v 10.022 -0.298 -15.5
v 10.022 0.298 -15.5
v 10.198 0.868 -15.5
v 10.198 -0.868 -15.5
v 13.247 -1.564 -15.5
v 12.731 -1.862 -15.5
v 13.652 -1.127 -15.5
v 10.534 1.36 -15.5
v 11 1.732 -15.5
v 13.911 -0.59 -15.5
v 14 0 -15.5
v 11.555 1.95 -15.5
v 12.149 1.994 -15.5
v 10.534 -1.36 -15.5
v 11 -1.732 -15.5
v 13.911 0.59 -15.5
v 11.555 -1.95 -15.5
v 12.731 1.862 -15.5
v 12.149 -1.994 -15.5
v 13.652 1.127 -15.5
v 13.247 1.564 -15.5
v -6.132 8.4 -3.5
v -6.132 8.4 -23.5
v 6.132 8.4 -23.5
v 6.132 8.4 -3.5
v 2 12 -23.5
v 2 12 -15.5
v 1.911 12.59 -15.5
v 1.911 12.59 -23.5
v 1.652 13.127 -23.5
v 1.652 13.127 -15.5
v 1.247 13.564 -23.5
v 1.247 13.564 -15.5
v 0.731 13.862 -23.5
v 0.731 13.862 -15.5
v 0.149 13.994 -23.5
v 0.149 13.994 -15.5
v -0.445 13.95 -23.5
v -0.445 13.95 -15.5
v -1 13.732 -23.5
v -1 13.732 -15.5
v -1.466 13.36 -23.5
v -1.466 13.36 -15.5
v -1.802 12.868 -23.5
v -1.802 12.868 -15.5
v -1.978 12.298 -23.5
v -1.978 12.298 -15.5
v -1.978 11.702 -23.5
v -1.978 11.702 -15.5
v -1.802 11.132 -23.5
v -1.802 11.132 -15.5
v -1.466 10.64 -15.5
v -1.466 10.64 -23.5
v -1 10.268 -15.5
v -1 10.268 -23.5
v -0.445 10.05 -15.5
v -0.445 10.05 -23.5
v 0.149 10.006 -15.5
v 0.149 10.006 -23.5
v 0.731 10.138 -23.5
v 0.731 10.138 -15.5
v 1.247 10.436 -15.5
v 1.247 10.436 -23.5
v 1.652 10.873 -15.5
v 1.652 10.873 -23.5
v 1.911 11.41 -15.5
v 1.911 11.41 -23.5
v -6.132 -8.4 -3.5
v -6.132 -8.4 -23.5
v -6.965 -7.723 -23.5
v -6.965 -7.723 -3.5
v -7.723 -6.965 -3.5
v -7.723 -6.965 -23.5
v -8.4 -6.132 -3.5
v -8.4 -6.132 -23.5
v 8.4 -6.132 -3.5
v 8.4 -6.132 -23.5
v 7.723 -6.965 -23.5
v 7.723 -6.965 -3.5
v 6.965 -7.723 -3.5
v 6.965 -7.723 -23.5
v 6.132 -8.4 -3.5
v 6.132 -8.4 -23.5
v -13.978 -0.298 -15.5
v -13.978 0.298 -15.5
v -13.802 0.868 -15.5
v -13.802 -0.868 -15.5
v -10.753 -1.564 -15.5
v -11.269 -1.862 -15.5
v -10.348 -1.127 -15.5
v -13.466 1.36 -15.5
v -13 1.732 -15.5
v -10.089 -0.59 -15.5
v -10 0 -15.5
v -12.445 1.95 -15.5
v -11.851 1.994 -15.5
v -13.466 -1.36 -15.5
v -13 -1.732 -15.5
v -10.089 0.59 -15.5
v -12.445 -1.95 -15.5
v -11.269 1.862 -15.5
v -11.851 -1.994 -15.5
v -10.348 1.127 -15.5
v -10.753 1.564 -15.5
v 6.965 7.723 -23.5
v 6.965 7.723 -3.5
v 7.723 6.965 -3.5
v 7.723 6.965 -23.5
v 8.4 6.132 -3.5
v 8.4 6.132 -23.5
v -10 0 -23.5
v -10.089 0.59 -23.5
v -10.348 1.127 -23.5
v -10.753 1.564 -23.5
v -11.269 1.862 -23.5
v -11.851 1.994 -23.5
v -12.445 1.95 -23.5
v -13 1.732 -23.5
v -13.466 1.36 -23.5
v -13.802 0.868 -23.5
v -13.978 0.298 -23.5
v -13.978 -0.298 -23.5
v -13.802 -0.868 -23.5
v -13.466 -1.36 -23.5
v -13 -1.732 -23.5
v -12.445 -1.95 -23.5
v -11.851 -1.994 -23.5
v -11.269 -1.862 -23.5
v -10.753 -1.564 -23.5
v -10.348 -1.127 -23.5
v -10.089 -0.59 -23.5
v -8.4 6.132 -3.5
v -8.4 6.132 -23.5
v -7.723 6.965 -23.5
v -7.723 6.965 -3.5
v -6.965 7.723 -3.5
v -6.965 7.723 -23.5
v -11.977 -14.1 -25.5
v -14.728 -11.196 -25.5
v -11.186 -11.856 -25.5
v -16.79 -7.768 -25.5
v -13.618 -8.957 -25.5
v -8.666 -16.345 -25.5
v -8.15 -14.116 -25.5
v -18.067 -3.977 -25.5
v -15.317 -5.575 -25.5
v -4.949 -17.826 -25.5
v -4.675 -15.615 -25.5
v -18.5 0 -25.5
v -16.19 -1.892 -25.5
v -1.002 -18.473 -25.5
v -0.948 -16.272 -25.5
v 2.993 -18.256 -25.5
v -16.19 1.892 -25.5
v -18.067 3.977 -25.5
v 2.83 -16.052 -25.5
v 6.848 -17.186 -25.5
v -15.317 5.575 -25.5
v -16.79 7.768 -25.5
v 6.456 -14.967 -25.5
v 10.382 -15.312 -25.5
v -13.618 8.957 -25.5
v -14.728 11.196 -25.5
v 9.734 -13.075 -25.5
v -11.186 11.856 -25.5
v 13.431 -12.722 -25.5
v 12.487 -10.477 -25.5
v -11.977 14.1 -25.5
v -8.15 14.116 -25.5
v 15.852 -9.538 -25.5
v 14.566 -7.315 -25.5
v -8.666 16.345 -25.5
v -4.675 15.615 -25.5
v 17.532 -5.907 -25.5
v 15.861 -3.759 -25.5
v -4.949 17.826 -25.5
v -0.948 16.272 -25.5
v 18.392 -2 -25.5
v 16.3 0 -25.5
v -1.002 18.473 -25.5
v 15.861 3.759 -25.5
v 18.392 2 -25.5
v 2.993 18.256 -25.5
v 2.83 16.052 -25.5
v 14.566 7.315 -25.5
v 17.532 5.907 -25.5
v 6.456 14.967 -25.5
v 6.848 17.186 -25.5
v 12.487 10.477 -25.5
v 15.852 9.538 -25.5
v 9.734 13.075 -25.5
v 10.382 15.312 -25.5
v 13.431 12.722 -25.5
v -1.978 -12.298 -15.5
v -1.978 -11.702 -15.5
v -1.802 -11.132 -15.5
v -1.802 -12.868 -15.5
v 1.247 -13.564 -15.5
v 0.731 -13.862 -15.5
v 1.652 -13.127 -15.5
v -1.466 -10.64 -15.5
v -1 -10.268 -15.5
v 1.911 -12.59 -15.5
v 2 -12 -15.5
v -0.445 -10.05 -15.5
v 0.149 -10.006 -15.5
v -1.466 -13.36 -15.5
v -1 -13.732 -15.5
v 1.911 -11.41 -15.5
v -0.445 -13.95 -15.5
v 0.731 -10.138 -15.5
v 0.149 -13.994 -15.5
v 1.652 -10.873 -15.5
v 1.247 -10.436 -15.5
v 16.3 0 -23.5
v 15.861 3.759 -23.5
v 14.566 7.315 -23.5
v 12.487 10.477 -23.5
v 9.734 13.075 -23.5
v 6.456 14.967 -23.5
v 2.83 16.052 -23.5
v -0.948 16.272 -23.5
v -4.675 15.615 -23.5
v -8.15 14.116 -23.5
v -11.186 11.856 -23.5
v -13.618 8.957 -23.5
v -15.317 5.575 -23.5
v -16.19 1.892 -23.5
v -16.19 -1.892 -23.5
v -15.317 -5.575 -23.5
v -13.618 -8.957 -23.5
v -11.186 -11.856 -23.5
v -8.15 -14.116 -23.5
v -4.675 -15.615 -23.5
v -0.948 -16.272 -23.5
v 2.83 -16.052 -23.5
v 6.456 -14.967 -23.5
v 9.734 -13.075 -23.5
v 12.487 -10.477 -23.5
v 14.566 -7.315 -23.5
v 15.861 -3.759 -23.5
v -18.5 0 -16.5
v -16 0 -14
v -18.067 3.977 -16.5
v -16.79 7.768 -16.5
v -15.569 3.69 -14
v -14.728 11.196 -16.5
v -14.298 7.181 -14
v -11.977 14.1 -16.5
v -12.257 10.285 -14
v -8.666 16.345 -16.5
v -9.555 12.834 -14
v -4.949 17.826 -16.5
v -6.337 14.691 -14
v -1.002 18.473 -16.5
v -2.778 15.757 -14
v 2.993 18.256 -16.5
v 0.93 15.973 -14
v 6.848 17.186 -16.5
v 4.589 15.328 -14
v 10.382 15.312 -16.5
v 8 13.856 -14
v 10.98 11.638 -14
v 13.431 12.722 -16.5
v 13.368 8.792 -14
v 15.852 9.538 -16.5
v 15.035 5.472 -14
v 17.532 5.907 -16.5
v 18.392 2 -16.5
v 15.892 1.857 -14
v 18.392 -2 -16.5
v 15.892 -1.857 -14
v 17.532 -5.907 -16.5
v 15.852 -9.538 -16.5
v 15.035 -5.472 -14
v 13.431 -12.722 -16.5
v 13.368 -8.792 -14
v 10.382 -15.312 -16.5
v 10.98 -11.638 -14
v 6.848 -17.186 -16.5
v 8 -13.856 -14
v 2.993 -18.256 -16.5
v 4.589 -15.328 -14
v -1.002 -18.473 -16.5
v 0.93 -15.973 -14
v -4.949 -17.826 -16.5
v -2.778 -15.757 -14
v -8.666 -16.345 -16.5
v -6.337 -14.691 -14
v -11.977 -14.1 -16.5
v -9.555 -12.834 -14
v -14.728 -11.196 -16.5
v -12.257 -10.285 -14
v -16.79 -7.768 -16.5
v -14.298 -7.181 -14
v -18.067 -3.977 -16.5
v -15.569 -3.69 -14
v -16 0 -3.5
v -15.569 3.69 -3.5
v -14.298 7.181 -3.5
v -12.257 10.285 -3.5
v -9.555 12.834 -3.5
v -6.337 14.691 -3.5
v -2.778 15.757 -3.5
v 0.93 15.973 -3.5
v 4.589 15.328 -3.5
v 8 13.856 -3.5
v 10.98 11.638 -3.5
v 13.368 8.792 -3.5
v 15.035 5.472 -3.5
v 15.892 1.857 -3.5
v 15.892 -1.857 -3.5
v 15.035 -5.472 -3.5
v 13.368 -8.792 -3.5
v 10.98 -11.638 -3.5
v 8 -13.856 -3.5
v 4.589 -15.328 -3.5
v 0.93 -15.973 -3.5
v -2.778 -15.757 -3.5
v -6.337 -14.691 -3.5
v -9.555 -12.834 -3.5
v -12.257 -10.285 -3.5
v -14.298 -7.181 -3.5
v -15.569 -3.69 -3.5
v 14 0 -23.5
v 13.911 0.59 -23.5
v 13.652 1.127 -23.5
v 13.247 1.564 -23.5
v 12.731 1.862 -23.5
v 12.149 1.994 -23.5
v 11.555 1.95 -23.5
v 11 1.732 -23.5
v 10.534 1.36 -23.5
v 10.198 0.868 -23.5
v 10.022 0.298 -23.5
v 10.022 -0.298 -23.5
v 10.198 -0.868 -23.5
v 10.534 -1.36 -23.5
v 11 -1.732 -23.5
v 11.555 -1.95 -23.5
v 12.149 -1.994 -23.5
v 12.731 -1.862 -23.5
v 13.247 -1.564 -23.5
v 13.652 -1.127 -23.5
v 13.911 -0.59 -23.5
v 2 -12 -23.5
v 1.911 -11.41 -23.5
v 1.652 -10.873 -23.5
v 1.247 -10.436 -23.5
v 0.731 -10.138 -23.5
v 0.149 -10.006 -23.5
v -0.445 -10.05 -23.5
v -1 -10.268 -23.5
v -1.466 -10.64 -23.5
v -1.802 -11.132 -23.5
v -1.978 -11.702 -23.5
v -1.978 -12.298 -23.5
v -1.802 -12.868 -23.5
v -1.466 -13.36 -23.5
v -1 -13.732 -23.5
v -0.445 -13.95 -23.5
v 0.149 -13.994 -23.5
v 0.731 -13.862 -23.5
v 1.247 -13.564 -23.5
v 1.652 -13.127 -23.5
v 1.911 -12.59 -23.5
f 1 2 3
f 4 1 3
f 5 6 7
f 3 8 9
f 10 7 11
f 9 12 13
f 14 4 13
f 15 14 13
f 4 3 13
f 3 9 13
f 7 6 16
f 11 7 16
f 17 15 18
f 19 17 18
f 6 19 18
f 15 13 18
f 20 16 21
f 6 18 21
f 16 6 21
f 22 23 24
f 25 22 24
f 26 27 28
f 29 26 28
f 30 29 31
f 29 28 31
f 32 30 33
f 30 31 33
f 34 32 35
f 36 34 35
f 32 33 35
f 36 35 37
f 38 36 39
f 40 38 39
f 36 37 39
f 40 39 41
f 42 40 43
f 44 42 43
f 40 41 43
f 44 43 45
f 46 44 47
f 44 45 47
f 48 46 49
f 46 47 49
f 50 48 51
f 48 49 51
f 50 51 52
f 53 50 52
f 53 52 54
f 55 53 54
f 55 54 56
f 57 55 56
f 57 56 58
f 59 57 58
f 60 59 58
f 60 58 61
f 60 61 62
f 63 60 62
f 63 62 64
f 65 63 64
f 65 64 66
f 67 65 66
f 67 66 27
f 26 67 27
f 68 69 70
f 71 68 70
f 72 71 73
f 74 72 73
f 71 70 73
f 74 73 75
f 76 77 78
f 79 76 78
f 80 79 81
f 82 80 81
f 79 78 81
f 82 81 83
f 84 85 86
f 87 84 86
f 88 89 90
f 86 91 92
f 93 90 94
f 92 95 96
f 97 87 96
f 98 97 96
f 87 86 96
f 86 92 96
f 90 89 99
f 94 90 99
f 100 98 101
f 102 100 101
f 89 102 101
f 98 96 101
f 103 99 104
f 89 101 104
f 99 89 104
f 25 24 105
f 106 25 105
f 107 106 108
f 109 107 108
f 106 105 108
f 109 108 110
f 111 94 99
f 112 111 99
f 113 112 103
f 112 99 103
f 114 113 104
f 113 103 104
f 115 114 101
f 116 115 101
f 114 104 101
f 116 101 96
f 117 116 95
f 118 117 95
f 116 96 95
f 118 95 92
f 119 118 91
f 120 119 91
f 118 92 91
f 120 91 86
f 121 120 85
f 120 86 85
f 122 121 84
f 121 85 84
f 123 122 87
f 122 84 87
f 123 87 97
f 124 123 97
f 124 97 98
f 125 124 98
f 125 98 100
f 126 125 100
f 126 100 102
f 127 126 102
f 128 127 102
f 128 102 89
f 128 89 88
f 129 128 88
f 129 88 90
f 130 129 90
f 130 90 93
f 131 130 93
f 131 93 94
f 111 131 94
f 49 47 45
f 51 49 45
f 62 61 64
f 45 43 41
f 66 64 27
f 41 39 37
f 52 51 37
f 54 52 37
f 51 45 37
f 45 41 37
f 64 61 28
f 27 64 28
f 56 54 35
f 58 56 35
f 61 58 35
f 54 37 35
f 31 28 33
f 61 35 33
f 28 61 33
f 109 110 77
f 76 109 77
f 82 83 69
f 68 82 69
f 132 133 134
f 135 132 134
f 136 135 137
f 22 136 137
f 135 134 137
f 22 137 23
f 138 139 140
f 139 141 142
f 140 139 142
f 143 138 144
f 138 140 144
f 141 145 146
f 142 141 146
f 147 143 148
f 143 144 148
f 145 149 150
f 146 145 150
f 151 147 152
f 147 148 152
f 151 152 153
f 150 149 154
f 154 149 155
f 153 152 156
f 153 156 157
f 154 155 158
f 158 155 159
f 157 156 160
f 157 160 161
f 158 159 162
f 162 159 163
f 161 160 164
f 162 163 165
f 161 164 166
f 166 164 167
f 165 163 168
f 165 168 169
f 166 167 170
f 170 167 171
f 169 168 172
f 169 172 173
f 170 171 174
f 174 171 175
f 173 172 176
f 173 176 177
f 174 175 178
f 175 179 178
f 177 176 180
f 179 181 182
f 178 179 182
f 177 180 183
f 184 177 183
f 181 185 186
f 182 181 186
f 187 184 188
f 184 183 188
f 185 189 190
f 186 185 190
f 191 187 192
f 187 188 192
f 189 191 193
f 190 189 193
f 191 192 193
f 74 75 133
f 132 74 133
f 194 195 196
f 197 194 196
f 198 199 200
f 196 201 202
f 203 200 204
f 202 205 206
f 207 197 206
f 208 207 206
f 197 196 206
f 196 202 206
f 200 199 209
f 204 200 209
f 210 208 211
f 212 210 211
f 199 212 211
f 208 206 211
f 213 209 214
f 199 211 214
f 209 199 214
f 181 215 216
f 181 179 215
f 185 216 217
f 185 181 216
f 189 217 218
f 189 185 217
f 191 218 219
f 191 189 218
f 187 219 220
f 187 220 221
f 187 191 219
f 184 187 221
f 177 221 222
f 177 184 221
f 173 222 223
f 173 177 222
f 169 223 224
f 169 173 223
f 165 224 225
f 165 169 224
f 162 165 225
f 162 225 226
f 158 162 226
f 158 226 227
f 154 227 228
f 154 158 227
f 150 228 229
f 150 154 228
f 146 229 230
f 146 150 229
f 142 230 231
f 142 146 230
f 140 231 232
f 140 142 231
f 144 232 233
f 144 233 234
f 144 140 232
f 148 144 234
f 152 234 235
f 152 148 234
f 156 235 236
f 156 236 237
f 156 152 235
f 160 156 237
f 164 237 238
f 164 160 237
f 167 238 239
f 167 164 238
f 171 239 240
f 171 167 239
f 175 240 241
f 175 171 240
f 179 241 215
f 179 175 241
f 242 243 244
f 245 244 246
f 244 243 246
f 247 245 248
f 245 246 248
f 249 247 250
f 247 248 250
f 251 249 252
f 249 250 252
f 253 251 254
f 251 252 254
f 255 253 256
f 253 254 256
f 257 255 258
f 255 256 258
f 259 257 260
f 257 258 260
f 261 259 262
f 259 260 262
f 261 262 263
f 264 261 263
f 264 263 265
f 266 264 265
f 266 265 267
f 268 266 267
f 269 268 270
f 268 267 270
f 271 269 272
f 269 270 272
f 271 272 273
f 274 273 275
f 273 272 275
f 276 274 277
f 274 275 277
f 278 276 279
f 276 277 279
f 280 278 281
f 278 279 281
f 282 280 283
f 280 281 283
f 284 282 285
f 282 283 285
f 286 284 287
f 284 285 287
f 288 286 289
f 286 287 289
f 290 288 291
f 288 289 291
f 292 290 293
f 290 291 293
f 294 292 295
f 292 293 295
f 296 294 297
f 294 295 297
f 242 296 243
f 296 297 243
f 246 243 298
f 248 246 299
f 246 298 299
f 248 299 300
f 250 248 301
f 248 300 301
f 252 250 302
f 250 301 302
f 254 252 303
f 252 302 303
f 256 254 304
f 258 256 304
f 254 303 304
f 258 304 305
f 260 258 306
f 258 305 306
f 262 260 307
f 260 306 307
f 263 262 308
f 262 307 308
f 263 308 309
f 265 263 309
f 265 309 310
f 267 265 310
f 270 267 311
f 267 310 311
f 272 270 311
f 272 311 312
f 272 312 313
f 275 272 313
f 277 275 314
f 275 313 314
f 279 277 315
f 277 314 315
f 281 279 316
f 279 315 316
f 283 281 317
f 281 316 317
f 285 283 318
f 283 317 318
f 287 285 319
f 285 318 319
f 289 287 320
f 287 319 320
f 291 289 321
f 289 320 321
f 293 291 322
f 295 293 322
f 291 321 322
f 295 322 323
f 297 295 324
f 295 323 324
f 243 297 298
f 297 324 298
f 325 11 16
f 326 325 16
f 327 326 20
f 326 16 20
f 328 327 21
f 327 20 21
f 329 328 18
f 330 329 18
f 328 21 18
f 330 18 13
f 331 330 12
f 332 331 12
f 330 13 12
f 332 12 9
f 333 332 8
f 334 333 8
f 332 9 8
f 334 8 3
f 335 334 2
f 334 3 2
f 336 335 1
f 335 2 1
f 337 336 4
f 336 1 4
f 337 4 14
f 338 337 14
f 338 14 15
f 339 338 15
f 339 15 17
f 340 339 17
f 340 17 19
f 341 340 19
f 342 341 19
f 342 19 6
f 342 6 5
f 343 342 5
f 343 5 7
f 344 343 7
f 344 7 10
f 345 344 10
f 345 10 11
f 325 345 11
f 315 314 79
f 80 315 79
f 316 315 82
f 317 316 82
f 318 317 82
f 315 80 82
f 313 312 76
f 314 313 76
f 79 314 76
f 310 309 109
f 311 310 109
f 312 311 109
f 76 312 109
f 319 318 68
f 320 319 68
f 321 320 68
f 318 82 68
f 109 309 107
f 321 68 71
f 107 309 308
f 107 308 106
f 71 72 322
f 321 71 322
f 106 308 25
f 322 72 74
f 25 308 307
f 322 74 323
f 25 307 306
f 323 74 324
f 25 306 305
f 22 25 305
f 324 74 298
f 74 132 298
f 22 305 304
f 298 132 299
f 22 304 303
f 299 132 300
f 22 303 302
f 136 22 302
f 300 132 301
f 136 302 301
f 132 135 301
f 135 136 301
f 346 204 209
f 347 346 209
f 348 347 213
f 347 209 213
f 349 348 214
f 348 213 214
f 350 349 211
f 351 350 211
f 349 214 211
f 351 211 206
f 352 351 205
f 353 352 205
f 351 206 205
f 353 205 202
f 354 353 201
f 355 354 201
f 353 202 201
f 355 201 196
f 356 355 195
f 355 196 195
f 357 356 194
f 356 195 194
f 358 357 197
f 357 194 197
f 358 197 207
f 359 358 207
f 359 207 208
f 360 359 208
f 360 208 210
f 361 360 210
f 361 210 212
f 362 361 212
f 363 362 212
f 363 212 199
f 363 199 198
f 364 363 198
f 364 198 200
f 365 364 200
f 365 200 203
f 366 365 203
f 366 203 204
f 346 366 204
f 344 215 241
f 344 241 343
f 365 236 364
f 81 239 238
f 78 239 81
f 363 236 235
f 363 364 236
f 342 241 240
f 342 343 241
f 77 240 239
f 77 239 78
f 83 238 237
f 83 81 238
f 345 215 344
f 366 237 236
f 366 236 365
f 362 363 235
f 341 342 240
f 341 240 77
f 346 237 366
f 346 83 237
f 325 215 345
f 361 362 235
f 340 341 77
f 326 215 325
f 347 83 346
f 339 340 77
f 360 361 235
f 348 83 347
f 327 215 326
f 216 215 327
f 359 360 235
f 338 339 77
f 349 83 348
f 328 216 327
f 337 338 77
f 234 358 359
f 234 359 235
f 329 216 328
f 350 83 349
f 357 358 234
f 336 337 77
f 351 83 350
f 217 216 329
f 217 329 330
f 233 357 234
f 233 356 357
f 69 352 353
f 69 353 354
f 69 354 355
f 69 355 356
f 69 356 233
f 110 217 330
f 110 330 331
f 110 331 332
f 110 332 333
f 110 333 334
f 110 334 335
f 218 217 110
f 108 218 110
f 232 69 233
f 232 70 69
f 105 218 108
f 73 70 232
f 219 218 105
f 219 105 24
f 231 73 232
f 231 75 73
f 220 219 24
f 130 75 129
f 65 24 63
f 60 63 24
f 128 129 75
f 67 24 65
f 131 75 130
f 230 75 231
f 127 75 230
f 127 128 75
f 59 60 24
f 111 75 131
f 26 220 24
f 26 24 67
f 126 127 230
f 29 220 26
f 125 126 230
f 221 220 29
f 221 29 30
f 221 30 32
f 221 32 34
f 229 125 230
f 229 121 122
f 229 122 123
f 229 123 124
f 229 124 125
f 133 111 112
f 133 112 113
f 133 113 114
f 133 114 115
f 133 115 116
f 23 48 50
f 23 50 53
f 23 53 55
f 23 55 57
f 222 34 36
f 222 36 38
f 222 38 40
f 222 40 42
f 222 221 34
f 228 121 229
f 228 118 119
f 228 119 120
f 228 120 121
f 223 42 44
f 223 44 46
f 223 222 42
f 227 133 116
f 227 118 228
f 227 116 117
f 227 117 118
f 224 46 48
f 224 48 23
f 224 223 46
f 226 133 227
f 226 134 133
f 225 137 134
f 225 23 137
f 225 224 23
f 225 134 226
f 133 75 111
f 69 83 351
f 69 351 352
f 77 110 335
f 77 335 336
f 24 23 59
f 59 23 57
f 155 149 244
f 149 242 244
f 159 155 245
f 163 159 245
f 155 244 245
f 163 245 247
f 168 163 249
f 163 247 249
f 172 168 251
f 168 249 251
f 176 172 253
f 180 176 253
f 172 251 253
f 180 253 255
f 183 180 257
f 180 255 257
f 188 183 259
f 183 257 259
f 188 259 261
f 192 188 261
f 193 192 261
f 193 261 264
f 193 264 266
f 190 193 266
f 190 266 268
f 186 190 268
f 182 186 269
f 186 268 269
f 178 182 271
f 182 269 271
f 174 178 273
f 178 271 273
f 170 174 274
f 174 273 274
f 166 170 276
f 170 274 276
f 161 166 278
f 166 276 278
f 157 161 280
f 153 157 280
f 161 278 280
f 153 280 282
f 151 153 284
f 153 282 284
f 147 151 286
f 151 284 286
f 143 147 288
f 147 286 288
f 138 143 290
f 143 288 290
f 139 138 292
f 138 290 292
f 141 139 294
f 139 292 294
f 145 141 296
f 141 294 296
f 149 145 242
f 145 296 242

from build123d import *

# Parameters (mm, degrees)
TAGLIO_ESTRUSIONE1_DEPTH = 35.18332927
SCHIZZO3_W               = 16.3
SCHIZZO3_H               = 2
FORO_4_0_4_1_D           = 4.00000006
FORO_4_0_4_1_DEPTH       = 8


with BuildPart() as part:
    # Schizzo1 → Rivoluzione1 (revolve)
    with BuildSketch(Plane.XZ, mode=Mode.PRIVATE) as rivoluzione1_sk:
        Polygon((16, -3.5), (0, -3.5), (0, -25.5), (18.5, -25.5), (18.5, -16.5), (16, -14), align=None)
    revolve(rivoluzione1_sk.sketch.rotate(Axis((0, 0, -3.5), (0, 0, -1)), 180), axis=Axis((0, 0, -3.5), (0, 0, -1)))

    # Schizzo2 → Taglio-Estrusione1 (cut, through all)
    with BuildSketch(Plane(origin=(0, 0, -25.5), x_dir=(-1, 0, 0), z_dir=(0, 0, -1))):
        with BuildLine():
            Line((8.4, -6.131883887), (8.4, 6.131883887))
            ThreePointArc((8.4, 6.131883887), (7.353910524, 7.353910524), (6.131883887, 8.4))
            Line((6.131883887, 8.4), (-6.131883887, 8.4))
            ThreePointArc((-6.131883887, 8.4), (-7.353910524, 7.353910524), (-8.4, 6.131883887))
            Line((-8.4, 6.131883887), (-8.4, -6.131883887))
            ThreePointArc((-8.4, -6.131883887), (-7.353910524, -7.353910524), (-6.131883887, -8.4))
            Line((-6.131883887, -8.4), (6.131883887, -8.4))
            ThreePointArc((6.131883887, -8.4), (7.353910524, -7.353910524), (8.4, -6.131883887))
        make_face()
    extrude(amount=-TAGLIO_ESTRUSIONE1_DEPTH, mode=Mode.SUBTRACT)

    # Schizzo3 → Taglia-Rivoluzione1 (revolve, cut)
    with BuildSketch(Plane(origin=(0, 0, 0), x_dir=(1, 0, 0), z_dir=(0, 1, 0))):
        with Locations((8.15, 24.5)):
            Rectangle(SCHIZZO3_W, SCHIZZO3_H)
    revolve(axis=Axis((0, 0, -25.5), (0, 0, 1)), mode=Mode.SUBTRACT)

    # Foro Ø4.0 (4)-1
    with Locations(Plane(origin=(0, 0, -23.5), x_dir=(-1, 0, 0), z_dir=(0, 0, -1))):
        with Locations((-12, 0), (0, -12), (12, 0), (0, 12)):
            Hole(FORO_4_0_4_1_D / 2, depth=FORO_4_0_4_1_DEPTH)


solid = part.part
